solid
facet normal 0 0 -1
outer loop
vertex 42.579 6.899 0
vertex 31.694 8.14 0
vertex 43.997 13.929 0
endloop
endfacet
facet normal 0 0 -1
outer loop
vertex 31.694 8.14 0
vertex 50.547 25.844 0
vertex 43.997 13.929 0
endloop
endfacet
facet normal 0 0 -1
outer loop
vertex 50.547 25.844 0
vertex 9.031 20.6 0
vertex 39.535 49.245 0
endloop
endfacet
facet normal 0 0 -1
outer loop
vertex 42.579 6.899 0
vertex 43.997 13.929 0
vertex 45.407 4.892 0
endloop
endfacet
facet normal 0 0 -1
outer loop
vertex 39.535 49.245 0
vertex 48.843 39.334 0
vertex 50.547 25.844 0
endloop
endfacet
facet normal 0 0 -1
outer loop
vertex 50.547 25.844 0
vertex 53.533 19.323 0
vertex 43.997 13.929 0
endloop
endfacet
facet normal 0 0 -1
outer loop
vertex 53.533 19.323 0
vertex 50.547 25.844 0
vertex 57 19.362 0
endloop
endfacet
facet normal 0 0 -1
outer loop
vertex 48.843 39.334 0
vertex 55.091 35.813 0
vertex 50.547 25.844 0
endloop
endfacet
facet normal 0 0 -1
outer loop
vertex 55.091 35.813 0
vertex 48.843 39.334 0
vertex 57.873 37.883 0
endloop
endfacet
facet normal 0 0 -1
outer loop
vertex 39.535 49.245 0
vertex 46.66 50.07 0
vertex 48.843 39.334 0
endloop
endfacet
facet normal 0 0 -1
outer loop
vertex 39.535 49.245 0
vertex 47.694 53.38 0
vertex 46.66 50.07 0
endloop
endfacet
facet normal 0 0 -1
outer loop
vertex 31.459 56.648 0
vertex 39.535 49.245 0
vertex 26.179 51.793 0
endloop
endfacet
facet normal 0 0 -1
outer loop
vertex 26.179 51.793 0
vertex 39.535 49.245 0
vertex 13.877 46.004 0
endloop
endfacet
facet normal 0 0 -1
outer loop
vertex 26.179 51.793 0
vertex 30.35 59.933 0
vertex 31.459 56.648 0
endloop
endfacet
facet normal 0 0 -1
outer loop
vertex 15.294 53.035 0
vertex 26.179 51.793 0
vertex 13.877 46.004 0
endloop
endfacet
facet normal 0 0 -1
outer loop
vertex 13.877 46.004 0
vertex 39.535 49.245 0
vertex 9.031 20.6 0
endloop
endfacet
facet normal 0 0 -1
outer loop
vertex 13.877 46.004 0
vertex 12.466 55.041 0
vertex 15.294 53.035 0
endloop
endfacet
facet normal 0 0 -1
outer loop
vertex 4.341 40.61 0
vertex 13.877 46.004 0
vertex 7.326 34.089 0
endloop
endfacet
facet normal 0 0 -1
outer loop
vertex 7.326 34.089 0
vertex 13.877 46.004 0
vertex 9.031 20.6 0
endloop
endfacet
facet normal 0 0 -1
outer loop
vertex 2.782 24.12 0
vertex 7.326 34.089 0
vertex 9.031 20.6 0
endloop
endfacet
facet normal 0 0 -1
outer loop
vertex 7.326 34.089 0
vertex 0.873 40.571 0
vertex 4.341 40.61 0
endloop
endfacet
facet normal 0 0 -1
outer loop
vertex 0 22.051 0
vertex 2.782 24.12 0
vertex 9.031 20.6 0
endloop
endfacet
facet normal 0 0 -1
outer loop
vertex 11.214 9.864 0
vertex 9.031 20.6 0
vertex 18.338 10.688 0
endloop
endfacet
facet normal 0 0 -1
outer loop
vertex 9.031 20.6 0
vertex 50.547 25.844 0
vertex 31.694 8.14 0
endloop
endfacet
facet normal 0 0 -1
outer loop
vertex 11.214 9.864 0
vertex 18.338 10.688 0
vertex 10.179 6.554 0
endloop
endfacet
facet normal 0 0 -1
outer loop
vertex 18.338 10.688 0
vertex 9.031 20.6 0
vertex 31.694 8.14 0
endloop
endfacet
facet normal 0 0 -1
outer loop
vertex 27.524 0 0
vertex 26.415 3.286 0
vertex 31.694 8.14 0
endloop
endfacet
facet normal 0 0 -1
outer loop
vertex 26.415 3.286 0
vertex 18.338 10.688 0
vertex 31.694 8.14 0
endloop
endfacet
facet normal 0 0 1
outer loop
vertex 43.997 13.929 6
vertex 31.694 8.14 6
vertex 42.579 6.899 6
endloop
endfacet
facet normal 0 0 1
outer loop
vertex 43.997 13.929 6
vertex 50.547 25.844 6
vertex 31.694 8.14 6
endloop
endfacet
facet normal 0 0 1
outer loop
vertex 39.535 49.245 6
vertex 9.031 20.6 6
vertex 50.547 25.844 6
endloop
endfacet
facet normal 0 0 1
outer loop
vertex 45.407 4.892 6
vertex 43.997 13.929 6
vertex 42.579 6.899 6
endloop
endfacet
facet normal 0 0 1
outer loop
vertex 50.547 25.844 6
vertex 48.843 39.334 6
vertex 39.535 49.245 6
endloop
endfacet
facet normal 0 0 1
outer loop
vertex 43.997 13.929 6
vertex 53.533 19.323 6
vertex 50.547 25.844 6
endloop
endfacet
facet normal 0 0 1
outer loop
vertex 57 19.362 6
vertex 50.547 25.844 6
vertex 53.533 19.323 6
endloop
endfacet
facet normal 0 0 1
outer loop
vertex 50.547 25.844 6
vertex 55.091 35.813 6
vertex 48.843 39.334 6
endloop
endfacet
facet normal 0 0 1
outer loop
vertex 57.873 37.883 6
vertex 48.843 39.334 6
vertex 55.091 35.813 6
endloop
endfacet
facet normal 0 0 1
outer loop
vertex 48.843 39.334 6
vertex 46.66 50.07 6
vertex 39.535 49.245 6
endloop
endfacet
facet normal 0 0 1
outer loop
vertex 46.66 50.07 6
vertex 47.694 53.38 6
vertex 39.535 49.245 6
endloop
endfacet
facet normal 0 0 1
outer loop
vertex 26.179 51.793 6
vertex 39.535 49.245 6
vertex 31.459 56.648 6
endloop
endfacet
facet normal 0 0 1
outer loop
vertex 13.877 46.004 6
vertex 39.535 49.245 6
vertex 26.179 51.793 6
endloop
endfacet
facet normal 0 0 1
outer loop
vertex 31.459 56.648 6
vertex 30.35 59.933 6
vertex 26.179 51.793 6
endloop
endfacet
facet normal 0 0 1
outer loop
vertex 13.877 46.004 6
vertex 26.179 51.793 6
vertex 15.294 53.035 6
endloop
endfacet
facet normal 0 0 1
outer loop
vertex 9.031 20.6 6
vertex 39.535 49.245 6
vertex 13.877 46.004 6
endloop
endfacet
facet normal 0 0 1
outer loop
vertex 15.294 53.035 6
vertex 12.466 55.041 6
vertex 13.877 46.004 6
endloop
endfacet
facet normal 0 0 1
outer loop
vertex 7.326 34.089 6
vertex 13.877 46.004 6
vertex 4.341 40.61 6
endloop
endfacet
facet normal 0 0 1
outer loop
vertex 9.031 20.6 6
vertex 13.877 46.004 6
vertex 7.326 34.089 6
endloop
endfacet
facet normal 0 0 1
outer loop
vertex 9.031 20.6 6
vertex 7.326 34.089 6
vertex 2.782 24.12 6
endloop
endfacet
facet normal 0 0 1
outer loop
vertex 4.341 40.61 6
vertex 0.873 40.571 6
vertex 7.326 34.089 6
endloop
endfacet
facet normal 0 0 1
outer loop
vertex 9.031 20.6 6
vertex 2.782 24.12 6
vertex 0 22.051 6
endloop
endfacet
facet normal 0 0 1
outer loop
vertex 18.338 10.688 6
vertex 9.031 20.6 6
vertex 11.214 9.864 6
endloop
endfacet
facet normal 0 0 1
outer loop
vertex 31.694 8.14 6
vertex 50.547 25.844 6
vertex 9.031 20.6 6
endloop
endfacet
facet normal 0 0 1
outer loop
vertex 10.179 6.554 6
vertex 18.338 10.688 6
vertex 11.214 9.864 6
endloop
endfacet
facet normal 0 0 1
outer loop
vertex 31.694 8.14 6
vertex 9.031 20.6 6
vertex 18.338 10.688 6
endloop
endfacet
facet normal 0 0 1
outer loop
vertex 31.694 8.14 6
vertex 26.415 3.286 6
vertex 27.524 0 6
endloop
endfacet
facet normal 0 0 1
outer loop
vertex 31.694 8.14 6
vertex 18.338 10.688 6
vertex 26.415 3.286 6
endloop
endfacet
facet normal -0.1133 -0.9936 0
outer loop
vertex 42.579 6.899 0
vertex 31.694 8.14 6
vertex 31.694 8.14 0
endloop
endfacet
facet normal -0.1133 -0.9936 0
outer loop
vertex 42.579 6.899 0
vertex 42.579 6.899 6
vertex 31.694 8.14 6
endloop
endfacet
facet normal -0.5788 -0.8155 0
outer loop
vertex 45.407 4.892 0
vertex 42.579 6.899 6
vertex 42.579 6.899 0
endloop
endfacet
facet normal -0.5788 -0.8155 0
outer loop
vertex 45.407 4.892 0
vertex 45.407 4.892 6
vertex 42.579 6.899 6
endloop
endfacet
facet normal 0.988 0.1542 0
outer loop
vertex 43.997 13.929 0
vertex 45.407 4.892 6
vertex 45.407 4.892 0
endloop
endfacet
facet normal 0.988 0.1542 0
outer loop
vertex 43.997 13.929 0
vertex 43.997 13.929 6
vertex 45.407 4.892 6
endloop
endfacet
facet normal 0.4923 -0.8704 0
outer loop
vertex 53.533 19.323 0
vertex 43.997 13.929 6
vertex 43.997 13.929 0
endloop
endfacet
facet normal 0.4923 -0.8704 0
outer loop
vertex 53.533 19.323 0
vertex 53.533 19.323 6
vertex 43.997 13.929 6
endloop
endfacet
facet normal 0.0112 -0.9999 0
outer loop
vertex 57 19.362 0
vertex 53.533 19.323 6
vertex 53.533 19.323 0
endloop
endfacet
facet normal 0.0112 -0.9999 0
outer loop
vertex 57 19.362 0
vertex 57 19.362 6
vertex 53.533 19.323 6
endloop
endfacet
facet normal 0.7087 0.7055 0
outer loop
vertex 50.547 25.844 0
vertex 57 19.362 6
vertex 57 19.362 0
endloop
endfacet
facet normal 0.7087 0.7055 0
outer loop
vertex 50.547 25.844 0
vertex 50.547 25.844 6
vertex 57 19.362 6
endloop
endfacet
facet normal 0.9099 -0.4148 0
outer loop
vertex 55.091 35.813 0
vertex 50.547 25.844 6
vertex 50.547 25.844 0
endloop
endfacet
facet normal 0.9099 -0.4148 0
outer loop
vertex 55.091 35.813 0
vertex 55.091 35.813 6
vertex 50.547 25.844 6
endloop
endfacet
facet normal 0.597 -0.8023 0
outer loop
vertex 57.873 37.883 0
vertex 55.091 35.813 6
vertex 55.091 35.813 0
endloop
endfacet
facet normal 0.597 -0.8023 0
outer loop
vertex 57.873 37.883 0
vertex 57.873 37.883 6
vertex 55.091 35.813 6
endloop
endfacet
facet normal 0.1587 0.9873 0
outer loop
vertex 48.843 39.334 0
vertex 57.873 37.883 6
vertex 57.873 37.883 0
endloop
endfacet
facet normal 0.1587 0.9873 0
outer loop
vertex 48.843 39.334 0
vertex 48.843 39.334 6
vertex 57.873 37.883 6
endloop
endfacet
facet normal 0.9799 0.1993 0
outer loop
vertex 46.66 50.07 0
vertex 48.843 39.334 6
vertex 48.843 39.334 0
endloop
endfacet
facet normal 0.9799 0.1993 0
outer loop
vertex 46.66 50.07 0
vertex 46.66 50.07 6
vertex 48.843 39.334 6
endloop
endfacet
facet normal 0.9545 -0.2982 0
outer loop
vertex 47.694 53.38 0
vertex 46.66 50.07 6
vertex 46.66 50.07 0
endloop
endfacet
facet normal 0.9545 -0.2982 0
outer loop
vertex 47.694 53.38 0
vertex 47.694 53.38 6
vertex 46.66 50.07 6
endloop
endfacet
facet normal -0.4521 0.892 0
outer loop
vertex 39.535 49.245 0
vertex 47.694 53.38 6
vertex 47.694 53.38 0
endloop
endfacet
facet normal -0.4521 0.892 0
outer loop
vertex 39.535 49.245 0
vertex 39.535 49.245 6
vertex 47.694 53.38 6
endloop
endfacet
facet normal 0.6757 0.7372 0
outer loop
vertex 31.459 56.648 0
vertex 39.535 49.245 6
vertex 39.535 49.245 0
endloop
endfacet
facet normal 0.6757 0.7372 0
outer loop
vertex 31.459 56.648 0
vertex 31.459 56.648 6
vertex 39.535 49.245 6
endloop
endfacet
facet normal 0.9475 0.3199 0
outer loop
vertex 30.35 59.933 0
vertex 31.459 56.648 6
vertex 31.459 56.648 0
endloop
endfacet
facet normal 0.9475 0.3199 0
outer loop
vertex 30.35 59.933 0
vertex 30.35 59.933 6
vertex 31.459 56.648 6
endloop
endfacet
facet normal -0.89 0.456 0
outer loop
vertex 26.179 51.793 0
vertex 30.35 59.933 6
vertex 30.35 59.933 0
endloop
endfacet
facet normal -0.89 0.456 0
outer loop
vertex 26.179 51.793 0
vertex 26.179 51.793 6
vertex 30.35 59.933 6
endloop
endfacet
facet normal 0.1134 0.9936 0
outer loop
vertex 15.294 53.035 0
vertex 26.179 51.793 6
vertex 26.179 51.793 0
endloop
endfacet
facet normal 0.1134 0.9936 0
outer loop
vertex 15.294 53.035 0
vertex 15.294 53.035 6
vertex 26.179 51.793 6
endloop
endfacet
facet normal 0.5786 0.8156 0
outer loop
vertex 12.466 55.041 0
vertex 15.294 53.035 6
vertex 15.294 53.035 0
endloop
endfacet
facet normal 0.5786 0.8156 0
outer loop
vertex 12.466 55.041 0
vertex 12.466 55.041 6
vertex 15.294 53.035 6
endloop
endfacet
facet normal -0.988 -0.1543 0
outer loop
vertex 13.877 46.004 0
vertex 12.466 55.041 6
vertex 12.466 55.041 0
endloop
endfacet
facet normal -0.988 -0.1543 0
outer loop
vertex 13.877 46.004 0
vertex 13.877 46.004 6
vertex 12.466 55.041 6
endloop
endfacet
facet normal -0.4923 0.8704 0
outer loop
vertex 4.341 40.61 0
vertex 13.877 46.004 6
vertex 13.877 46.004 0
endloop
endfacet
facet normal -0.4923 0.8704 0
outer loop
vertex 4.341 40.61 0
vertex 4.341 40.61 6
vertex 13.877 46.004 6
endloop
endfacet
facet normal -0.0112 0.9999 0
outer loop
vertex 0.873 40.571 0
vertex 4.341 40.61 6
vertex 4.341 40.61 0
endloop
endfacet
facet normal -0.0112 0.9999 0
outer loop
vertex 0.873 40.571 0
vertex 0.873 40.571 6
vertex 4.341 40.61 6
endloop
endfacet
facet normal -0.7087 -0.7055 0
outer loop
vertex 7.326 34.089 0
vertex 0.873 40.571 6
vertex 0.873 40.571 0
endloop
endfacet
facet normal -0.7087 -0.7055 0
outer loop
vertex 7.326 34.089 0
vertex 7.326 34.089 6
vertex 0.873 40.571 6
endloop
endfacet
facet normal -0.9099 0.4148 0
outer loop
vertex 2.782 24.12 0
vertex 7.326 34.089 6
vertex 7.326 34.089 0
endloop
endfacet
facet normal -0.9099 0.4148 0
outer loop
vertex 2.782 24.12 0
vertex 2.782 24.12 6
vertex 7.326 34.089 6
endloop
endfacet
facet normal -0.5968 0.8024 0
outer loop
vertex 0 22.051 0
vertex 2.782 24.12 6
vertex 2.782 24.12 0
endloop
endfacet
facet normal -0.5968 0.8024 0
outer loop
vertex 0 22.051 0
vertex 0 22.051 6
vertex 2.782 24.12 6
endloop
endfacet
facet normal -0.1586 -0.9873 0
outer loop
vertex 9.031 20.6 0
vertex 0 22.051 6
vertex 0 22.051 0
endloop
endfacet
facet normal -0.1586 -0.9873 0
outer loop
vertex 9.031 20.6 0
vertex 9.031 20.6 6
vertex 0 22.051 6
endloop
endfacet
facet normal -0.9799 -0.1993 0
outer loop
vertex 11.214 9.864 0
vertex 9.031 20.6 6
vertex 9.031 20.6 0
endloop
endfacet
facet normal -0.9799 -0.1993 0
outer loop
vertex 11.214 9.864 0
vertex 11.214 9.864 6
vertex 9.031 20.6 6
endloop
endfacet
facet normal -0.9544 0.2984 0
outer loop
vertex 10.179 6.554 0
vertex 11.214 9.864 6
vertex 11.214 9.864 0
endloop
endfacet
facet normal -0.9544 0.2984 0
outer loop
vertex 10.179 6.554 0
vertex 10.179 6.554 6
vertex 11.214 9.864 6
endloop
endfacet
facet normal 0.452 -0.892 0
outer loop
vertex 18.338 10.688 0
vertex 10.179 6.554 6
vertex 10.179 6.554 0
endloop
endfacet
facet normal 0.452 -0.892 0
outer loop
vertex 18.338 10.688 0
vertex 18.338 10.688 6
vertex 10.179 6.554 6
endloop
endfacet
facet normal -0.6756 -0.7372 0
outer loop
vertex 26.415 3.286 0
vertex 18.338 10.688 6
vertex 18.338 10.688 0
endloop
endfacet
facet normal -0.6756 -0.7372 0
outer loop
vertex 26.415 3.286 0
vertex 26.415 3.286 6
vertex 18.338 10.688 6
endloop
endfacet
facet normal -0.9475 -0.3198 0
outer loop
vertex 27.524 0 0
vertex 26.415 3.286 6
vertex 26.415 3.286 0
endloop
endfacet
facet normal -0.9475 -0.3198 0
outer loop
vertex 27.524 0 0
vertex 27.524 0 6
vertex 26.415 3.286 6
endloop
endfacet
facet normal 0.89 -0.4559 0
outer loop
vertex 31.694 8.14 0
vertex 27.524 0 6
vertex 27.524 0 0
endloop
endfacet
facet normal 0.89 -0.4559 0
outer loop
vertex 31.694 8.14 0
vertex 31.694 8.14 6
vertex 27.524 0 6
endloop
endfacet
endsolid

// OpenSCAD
$fn = 32;

// ----------------------------------------------------------------------
// Fan rotor section: 10 blades, 22 mm hub radius, 8 mm blades
// ----------------------------------------------------------------------

// --- parameters (mm) ---
profile_height = 6;       // extrusion height
profile_points = 30;      // points of the closed outline

profile = [[50.547, 25.844], [55.091, 35.813], [57.873, 37.883], [48.843, 39.334], [46.66, 50.07], [47.694, 53.38], [39.535, 49.245], [31.459, 56.648], [30.35, 59.933], [26.179, 51.793], [15.294, 53.035], [12.466, 55.041], [13.877, 46.004], [4.341, 40.61], [0.873, 40.571], [7.326, 34.089], [2.782, 24.12], [0, 22.051], [9.031, 20.6], [11.214, 9.864], [10.179, 6.554], [18.338, 10.688], [26.415, 3.286], [27.524, 0], [31.694, 8.14], [42.579, 6.899], [45.407, 4.892], [43.997, 13.929], [53.533, 19.323], [57, 19.362]];  // single closed polygon, 30 points, counter clockwise

// --- the one profile operation ---
linear_extrude(height = profile_height) polygon(points = profile);
